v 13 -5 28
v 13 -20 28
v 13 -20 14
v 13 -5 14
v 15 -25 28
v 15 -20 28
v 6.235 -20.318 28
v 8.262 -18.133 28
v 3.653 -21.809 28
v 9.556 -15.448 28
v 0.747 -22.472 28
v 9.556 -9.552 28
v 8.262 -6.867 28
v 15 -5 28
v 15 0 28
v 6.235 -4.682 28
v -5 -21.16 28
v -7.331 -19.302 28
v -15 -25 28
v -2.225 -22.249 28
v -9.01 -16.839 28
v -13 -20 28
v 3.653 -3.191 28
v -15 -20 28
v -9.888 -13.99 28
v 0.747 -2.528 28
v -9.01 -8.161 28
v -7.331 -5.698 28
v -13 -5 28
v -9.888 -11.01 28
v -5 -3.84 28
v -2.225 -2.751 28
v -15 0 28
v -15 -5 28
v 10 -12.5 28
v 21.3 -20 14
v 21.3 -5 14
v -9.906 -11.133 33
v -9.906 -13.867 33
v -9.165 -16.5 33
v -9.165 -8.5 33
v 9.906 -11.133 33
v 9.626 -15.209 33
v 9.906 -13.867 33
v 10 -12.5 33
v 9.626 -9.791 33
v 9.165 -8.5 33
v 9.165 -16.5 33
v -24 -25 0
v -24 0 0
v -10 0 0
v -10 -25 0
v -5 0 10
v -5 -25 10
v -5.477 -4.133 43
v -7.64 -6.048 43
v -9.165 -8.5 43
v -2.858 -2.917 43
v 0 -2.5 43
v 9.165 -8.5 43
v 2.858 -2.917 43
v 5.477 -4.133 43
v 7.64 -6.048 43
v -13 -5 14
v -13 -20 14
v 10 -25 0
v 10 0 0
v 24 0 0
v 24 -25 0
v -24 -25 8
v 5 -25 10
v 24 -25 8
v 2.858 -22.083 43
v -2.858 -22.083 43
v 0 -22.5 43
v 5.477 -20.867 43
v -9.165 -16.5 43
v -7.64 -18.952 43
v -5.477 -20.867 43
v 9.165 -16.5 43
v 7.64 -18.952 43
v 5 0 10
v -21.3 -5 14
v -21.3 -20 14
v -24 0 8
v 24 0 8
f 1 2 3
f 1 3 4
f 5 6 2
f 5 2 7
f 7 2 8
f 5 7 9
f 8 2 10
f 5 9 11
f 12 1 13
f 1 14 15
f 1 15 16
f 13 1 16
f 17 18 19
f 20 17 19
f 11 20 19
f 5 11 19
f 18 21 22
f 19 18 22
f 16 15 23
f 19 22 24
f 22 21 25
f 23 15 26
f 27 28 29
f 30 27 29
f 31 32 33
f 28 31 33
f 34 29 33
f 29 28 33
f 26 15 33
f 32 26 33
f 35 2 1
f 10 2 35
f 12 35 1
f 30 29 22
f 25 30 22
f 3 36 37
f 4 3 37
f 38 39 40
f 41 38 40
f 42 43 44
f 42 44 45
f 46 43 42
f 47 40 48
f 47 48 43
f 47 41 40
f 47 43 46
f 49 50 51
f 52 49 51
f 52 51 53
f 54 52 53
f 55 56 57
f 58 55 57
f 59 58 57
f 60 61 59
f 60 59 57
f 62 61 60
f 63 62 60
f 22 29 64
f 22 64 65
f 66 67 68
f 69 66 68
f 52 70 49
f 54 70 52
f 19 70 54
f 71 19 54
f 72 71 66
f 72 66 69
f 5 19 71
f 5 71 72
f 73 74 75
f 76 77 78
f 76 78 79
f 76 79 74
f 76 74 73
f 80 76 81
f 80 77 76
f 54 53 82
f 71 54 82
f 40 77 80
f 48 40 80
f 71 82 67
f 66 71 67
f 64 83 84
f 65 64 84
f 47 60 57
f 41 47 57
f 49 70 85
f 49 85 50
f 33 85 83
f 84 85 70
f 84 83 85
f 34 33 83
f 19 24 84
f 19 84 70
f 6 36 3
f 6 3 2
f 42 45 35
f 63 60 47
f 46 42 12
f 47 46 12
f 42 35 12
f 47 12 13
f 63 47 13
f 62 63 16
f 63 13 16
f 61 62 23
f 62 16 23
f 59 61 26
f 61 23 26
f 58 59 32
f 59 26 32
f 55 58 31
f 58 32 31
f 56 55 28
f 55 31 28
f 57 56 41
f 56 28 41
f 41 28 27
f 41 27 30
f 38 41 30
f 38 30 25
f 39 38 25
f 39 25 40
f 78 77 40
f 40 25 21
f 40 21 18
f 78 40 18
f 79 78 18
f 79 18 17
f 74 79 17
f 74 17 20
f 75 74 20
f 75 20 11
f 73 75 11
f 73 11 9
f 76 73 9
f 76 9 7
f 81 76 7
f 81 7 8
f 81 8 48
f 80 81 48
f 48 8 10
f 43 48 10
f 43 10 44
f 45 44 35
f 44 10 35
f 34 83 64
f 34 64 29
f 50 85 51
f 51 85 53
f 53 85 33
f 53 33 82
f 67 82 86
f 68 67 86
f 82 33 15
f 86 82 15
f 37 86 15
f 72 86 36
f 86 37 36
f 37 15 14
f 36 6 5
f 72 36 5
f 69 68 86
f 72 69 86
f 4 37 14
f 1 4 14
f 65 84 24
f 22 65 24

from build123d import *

# Parameters (mm, degrees)
F1_DEPTH   = 25
F2_SIZE2   = 9
F2_SIZE    = 20
F2_2_SIZE2 = 9
F2_2_SIZE  = 20
F3_R       = 10
F4_DEPTH   = 15
F6_DEPTH   = 10
F7_W       = 15
F7_H       = 14
F8_DEPTH   = 11
F9_W       = 15
F9_H       = 14
F10_DEPTH  = 11


with BuildPart() as f1:
    # F0 (on Front) → F1 (new body)
    with BuildSketch(Plane.XZ):
        Polygon((24, 28), (-24, 28), (-24, 0), (-10, 0), (-5, 10), (5, 10), (10, 0), (24, 0), align=None)
    extrude(amount=F1_DEPTH)

    # F2
    f2_edges = [f1.edges().sort_by_distance(p)[0] for p in [
        (-24, -12.5, 28),
    ]]
    f2_side = f1.faces().sort_by_distance((-24, -12.5, 14))[0]
    chamfer(f2_edges, length=F2_SIZE, length2=F2_SIZE2, reference=f2_side)

    # F2#2
    f2_2_edges = [f1.edges().sort_by_distance(p)[0] for p in [
        (24, -12.5, 28),
    ]]
    f2_2_side = f1.faces().sort_by_distance((24, -12.5, 14))[0]
    chamfer(f2_2_edges, length=F2_2_SIZE, length2=F2_2_SIZE2, reference=f2_2_side)

    # F3 (on face) → F4 (join)
    with BuildSketch(Plane.XY.offset(28)):
        with Locations((0, -12.5)):
            Circle(F3_R)
    extrude(amount=F4_DEPTH)

    # F5 (on face) → F6 (cut)
    with BuildSketch(Plane.XY.offset(43)):
        with BuildLine():
            Line((9.1651513899, -8.5), (-9.1651513899, -8.5))
            ThreePointArc((-9.1651513899, -8.5), (-10, -12.5), (-9.1651513899, -16.5))
            Line((-9.1651513899, -16.5), (9.1651513899, -16.5))
            ThreePointArc((9.1651513899, -16.5), (9.7890631293, -14.5430964369), (10, -12.5))
            ThreePointArc((10, -12.5), (9.7890631293, -10.4569035631), (9.1651513899, -8.5))
        make_face()
    extrude(amount=-F6_DEPTH, mode=Mode.SUBTRACT)

    # F7 (on face) → F8 (cut)
    with BuildSketch(Plane.YZ.offset(24)):
        with Locations((-12.5, 21)):
            Rectangle(F7_W, F7_H)
    extrude(amount=-F8_DEPTH, mode=Mode.SUBTRACT)

    # F9 (on face) → F10 (cut)
    with BuildSketch(Plane(origin=(-24, 0, 0), x_dir=(0, -1, 0), z_dir=(-1, 0, 0))):
        with Locations((12.5, 21)):
            Rectangle(F9_W, F9_H)
    extrude(amount=-F10_DEPTH, mode=Mode.SUBTRACT)


solid = f1.part
